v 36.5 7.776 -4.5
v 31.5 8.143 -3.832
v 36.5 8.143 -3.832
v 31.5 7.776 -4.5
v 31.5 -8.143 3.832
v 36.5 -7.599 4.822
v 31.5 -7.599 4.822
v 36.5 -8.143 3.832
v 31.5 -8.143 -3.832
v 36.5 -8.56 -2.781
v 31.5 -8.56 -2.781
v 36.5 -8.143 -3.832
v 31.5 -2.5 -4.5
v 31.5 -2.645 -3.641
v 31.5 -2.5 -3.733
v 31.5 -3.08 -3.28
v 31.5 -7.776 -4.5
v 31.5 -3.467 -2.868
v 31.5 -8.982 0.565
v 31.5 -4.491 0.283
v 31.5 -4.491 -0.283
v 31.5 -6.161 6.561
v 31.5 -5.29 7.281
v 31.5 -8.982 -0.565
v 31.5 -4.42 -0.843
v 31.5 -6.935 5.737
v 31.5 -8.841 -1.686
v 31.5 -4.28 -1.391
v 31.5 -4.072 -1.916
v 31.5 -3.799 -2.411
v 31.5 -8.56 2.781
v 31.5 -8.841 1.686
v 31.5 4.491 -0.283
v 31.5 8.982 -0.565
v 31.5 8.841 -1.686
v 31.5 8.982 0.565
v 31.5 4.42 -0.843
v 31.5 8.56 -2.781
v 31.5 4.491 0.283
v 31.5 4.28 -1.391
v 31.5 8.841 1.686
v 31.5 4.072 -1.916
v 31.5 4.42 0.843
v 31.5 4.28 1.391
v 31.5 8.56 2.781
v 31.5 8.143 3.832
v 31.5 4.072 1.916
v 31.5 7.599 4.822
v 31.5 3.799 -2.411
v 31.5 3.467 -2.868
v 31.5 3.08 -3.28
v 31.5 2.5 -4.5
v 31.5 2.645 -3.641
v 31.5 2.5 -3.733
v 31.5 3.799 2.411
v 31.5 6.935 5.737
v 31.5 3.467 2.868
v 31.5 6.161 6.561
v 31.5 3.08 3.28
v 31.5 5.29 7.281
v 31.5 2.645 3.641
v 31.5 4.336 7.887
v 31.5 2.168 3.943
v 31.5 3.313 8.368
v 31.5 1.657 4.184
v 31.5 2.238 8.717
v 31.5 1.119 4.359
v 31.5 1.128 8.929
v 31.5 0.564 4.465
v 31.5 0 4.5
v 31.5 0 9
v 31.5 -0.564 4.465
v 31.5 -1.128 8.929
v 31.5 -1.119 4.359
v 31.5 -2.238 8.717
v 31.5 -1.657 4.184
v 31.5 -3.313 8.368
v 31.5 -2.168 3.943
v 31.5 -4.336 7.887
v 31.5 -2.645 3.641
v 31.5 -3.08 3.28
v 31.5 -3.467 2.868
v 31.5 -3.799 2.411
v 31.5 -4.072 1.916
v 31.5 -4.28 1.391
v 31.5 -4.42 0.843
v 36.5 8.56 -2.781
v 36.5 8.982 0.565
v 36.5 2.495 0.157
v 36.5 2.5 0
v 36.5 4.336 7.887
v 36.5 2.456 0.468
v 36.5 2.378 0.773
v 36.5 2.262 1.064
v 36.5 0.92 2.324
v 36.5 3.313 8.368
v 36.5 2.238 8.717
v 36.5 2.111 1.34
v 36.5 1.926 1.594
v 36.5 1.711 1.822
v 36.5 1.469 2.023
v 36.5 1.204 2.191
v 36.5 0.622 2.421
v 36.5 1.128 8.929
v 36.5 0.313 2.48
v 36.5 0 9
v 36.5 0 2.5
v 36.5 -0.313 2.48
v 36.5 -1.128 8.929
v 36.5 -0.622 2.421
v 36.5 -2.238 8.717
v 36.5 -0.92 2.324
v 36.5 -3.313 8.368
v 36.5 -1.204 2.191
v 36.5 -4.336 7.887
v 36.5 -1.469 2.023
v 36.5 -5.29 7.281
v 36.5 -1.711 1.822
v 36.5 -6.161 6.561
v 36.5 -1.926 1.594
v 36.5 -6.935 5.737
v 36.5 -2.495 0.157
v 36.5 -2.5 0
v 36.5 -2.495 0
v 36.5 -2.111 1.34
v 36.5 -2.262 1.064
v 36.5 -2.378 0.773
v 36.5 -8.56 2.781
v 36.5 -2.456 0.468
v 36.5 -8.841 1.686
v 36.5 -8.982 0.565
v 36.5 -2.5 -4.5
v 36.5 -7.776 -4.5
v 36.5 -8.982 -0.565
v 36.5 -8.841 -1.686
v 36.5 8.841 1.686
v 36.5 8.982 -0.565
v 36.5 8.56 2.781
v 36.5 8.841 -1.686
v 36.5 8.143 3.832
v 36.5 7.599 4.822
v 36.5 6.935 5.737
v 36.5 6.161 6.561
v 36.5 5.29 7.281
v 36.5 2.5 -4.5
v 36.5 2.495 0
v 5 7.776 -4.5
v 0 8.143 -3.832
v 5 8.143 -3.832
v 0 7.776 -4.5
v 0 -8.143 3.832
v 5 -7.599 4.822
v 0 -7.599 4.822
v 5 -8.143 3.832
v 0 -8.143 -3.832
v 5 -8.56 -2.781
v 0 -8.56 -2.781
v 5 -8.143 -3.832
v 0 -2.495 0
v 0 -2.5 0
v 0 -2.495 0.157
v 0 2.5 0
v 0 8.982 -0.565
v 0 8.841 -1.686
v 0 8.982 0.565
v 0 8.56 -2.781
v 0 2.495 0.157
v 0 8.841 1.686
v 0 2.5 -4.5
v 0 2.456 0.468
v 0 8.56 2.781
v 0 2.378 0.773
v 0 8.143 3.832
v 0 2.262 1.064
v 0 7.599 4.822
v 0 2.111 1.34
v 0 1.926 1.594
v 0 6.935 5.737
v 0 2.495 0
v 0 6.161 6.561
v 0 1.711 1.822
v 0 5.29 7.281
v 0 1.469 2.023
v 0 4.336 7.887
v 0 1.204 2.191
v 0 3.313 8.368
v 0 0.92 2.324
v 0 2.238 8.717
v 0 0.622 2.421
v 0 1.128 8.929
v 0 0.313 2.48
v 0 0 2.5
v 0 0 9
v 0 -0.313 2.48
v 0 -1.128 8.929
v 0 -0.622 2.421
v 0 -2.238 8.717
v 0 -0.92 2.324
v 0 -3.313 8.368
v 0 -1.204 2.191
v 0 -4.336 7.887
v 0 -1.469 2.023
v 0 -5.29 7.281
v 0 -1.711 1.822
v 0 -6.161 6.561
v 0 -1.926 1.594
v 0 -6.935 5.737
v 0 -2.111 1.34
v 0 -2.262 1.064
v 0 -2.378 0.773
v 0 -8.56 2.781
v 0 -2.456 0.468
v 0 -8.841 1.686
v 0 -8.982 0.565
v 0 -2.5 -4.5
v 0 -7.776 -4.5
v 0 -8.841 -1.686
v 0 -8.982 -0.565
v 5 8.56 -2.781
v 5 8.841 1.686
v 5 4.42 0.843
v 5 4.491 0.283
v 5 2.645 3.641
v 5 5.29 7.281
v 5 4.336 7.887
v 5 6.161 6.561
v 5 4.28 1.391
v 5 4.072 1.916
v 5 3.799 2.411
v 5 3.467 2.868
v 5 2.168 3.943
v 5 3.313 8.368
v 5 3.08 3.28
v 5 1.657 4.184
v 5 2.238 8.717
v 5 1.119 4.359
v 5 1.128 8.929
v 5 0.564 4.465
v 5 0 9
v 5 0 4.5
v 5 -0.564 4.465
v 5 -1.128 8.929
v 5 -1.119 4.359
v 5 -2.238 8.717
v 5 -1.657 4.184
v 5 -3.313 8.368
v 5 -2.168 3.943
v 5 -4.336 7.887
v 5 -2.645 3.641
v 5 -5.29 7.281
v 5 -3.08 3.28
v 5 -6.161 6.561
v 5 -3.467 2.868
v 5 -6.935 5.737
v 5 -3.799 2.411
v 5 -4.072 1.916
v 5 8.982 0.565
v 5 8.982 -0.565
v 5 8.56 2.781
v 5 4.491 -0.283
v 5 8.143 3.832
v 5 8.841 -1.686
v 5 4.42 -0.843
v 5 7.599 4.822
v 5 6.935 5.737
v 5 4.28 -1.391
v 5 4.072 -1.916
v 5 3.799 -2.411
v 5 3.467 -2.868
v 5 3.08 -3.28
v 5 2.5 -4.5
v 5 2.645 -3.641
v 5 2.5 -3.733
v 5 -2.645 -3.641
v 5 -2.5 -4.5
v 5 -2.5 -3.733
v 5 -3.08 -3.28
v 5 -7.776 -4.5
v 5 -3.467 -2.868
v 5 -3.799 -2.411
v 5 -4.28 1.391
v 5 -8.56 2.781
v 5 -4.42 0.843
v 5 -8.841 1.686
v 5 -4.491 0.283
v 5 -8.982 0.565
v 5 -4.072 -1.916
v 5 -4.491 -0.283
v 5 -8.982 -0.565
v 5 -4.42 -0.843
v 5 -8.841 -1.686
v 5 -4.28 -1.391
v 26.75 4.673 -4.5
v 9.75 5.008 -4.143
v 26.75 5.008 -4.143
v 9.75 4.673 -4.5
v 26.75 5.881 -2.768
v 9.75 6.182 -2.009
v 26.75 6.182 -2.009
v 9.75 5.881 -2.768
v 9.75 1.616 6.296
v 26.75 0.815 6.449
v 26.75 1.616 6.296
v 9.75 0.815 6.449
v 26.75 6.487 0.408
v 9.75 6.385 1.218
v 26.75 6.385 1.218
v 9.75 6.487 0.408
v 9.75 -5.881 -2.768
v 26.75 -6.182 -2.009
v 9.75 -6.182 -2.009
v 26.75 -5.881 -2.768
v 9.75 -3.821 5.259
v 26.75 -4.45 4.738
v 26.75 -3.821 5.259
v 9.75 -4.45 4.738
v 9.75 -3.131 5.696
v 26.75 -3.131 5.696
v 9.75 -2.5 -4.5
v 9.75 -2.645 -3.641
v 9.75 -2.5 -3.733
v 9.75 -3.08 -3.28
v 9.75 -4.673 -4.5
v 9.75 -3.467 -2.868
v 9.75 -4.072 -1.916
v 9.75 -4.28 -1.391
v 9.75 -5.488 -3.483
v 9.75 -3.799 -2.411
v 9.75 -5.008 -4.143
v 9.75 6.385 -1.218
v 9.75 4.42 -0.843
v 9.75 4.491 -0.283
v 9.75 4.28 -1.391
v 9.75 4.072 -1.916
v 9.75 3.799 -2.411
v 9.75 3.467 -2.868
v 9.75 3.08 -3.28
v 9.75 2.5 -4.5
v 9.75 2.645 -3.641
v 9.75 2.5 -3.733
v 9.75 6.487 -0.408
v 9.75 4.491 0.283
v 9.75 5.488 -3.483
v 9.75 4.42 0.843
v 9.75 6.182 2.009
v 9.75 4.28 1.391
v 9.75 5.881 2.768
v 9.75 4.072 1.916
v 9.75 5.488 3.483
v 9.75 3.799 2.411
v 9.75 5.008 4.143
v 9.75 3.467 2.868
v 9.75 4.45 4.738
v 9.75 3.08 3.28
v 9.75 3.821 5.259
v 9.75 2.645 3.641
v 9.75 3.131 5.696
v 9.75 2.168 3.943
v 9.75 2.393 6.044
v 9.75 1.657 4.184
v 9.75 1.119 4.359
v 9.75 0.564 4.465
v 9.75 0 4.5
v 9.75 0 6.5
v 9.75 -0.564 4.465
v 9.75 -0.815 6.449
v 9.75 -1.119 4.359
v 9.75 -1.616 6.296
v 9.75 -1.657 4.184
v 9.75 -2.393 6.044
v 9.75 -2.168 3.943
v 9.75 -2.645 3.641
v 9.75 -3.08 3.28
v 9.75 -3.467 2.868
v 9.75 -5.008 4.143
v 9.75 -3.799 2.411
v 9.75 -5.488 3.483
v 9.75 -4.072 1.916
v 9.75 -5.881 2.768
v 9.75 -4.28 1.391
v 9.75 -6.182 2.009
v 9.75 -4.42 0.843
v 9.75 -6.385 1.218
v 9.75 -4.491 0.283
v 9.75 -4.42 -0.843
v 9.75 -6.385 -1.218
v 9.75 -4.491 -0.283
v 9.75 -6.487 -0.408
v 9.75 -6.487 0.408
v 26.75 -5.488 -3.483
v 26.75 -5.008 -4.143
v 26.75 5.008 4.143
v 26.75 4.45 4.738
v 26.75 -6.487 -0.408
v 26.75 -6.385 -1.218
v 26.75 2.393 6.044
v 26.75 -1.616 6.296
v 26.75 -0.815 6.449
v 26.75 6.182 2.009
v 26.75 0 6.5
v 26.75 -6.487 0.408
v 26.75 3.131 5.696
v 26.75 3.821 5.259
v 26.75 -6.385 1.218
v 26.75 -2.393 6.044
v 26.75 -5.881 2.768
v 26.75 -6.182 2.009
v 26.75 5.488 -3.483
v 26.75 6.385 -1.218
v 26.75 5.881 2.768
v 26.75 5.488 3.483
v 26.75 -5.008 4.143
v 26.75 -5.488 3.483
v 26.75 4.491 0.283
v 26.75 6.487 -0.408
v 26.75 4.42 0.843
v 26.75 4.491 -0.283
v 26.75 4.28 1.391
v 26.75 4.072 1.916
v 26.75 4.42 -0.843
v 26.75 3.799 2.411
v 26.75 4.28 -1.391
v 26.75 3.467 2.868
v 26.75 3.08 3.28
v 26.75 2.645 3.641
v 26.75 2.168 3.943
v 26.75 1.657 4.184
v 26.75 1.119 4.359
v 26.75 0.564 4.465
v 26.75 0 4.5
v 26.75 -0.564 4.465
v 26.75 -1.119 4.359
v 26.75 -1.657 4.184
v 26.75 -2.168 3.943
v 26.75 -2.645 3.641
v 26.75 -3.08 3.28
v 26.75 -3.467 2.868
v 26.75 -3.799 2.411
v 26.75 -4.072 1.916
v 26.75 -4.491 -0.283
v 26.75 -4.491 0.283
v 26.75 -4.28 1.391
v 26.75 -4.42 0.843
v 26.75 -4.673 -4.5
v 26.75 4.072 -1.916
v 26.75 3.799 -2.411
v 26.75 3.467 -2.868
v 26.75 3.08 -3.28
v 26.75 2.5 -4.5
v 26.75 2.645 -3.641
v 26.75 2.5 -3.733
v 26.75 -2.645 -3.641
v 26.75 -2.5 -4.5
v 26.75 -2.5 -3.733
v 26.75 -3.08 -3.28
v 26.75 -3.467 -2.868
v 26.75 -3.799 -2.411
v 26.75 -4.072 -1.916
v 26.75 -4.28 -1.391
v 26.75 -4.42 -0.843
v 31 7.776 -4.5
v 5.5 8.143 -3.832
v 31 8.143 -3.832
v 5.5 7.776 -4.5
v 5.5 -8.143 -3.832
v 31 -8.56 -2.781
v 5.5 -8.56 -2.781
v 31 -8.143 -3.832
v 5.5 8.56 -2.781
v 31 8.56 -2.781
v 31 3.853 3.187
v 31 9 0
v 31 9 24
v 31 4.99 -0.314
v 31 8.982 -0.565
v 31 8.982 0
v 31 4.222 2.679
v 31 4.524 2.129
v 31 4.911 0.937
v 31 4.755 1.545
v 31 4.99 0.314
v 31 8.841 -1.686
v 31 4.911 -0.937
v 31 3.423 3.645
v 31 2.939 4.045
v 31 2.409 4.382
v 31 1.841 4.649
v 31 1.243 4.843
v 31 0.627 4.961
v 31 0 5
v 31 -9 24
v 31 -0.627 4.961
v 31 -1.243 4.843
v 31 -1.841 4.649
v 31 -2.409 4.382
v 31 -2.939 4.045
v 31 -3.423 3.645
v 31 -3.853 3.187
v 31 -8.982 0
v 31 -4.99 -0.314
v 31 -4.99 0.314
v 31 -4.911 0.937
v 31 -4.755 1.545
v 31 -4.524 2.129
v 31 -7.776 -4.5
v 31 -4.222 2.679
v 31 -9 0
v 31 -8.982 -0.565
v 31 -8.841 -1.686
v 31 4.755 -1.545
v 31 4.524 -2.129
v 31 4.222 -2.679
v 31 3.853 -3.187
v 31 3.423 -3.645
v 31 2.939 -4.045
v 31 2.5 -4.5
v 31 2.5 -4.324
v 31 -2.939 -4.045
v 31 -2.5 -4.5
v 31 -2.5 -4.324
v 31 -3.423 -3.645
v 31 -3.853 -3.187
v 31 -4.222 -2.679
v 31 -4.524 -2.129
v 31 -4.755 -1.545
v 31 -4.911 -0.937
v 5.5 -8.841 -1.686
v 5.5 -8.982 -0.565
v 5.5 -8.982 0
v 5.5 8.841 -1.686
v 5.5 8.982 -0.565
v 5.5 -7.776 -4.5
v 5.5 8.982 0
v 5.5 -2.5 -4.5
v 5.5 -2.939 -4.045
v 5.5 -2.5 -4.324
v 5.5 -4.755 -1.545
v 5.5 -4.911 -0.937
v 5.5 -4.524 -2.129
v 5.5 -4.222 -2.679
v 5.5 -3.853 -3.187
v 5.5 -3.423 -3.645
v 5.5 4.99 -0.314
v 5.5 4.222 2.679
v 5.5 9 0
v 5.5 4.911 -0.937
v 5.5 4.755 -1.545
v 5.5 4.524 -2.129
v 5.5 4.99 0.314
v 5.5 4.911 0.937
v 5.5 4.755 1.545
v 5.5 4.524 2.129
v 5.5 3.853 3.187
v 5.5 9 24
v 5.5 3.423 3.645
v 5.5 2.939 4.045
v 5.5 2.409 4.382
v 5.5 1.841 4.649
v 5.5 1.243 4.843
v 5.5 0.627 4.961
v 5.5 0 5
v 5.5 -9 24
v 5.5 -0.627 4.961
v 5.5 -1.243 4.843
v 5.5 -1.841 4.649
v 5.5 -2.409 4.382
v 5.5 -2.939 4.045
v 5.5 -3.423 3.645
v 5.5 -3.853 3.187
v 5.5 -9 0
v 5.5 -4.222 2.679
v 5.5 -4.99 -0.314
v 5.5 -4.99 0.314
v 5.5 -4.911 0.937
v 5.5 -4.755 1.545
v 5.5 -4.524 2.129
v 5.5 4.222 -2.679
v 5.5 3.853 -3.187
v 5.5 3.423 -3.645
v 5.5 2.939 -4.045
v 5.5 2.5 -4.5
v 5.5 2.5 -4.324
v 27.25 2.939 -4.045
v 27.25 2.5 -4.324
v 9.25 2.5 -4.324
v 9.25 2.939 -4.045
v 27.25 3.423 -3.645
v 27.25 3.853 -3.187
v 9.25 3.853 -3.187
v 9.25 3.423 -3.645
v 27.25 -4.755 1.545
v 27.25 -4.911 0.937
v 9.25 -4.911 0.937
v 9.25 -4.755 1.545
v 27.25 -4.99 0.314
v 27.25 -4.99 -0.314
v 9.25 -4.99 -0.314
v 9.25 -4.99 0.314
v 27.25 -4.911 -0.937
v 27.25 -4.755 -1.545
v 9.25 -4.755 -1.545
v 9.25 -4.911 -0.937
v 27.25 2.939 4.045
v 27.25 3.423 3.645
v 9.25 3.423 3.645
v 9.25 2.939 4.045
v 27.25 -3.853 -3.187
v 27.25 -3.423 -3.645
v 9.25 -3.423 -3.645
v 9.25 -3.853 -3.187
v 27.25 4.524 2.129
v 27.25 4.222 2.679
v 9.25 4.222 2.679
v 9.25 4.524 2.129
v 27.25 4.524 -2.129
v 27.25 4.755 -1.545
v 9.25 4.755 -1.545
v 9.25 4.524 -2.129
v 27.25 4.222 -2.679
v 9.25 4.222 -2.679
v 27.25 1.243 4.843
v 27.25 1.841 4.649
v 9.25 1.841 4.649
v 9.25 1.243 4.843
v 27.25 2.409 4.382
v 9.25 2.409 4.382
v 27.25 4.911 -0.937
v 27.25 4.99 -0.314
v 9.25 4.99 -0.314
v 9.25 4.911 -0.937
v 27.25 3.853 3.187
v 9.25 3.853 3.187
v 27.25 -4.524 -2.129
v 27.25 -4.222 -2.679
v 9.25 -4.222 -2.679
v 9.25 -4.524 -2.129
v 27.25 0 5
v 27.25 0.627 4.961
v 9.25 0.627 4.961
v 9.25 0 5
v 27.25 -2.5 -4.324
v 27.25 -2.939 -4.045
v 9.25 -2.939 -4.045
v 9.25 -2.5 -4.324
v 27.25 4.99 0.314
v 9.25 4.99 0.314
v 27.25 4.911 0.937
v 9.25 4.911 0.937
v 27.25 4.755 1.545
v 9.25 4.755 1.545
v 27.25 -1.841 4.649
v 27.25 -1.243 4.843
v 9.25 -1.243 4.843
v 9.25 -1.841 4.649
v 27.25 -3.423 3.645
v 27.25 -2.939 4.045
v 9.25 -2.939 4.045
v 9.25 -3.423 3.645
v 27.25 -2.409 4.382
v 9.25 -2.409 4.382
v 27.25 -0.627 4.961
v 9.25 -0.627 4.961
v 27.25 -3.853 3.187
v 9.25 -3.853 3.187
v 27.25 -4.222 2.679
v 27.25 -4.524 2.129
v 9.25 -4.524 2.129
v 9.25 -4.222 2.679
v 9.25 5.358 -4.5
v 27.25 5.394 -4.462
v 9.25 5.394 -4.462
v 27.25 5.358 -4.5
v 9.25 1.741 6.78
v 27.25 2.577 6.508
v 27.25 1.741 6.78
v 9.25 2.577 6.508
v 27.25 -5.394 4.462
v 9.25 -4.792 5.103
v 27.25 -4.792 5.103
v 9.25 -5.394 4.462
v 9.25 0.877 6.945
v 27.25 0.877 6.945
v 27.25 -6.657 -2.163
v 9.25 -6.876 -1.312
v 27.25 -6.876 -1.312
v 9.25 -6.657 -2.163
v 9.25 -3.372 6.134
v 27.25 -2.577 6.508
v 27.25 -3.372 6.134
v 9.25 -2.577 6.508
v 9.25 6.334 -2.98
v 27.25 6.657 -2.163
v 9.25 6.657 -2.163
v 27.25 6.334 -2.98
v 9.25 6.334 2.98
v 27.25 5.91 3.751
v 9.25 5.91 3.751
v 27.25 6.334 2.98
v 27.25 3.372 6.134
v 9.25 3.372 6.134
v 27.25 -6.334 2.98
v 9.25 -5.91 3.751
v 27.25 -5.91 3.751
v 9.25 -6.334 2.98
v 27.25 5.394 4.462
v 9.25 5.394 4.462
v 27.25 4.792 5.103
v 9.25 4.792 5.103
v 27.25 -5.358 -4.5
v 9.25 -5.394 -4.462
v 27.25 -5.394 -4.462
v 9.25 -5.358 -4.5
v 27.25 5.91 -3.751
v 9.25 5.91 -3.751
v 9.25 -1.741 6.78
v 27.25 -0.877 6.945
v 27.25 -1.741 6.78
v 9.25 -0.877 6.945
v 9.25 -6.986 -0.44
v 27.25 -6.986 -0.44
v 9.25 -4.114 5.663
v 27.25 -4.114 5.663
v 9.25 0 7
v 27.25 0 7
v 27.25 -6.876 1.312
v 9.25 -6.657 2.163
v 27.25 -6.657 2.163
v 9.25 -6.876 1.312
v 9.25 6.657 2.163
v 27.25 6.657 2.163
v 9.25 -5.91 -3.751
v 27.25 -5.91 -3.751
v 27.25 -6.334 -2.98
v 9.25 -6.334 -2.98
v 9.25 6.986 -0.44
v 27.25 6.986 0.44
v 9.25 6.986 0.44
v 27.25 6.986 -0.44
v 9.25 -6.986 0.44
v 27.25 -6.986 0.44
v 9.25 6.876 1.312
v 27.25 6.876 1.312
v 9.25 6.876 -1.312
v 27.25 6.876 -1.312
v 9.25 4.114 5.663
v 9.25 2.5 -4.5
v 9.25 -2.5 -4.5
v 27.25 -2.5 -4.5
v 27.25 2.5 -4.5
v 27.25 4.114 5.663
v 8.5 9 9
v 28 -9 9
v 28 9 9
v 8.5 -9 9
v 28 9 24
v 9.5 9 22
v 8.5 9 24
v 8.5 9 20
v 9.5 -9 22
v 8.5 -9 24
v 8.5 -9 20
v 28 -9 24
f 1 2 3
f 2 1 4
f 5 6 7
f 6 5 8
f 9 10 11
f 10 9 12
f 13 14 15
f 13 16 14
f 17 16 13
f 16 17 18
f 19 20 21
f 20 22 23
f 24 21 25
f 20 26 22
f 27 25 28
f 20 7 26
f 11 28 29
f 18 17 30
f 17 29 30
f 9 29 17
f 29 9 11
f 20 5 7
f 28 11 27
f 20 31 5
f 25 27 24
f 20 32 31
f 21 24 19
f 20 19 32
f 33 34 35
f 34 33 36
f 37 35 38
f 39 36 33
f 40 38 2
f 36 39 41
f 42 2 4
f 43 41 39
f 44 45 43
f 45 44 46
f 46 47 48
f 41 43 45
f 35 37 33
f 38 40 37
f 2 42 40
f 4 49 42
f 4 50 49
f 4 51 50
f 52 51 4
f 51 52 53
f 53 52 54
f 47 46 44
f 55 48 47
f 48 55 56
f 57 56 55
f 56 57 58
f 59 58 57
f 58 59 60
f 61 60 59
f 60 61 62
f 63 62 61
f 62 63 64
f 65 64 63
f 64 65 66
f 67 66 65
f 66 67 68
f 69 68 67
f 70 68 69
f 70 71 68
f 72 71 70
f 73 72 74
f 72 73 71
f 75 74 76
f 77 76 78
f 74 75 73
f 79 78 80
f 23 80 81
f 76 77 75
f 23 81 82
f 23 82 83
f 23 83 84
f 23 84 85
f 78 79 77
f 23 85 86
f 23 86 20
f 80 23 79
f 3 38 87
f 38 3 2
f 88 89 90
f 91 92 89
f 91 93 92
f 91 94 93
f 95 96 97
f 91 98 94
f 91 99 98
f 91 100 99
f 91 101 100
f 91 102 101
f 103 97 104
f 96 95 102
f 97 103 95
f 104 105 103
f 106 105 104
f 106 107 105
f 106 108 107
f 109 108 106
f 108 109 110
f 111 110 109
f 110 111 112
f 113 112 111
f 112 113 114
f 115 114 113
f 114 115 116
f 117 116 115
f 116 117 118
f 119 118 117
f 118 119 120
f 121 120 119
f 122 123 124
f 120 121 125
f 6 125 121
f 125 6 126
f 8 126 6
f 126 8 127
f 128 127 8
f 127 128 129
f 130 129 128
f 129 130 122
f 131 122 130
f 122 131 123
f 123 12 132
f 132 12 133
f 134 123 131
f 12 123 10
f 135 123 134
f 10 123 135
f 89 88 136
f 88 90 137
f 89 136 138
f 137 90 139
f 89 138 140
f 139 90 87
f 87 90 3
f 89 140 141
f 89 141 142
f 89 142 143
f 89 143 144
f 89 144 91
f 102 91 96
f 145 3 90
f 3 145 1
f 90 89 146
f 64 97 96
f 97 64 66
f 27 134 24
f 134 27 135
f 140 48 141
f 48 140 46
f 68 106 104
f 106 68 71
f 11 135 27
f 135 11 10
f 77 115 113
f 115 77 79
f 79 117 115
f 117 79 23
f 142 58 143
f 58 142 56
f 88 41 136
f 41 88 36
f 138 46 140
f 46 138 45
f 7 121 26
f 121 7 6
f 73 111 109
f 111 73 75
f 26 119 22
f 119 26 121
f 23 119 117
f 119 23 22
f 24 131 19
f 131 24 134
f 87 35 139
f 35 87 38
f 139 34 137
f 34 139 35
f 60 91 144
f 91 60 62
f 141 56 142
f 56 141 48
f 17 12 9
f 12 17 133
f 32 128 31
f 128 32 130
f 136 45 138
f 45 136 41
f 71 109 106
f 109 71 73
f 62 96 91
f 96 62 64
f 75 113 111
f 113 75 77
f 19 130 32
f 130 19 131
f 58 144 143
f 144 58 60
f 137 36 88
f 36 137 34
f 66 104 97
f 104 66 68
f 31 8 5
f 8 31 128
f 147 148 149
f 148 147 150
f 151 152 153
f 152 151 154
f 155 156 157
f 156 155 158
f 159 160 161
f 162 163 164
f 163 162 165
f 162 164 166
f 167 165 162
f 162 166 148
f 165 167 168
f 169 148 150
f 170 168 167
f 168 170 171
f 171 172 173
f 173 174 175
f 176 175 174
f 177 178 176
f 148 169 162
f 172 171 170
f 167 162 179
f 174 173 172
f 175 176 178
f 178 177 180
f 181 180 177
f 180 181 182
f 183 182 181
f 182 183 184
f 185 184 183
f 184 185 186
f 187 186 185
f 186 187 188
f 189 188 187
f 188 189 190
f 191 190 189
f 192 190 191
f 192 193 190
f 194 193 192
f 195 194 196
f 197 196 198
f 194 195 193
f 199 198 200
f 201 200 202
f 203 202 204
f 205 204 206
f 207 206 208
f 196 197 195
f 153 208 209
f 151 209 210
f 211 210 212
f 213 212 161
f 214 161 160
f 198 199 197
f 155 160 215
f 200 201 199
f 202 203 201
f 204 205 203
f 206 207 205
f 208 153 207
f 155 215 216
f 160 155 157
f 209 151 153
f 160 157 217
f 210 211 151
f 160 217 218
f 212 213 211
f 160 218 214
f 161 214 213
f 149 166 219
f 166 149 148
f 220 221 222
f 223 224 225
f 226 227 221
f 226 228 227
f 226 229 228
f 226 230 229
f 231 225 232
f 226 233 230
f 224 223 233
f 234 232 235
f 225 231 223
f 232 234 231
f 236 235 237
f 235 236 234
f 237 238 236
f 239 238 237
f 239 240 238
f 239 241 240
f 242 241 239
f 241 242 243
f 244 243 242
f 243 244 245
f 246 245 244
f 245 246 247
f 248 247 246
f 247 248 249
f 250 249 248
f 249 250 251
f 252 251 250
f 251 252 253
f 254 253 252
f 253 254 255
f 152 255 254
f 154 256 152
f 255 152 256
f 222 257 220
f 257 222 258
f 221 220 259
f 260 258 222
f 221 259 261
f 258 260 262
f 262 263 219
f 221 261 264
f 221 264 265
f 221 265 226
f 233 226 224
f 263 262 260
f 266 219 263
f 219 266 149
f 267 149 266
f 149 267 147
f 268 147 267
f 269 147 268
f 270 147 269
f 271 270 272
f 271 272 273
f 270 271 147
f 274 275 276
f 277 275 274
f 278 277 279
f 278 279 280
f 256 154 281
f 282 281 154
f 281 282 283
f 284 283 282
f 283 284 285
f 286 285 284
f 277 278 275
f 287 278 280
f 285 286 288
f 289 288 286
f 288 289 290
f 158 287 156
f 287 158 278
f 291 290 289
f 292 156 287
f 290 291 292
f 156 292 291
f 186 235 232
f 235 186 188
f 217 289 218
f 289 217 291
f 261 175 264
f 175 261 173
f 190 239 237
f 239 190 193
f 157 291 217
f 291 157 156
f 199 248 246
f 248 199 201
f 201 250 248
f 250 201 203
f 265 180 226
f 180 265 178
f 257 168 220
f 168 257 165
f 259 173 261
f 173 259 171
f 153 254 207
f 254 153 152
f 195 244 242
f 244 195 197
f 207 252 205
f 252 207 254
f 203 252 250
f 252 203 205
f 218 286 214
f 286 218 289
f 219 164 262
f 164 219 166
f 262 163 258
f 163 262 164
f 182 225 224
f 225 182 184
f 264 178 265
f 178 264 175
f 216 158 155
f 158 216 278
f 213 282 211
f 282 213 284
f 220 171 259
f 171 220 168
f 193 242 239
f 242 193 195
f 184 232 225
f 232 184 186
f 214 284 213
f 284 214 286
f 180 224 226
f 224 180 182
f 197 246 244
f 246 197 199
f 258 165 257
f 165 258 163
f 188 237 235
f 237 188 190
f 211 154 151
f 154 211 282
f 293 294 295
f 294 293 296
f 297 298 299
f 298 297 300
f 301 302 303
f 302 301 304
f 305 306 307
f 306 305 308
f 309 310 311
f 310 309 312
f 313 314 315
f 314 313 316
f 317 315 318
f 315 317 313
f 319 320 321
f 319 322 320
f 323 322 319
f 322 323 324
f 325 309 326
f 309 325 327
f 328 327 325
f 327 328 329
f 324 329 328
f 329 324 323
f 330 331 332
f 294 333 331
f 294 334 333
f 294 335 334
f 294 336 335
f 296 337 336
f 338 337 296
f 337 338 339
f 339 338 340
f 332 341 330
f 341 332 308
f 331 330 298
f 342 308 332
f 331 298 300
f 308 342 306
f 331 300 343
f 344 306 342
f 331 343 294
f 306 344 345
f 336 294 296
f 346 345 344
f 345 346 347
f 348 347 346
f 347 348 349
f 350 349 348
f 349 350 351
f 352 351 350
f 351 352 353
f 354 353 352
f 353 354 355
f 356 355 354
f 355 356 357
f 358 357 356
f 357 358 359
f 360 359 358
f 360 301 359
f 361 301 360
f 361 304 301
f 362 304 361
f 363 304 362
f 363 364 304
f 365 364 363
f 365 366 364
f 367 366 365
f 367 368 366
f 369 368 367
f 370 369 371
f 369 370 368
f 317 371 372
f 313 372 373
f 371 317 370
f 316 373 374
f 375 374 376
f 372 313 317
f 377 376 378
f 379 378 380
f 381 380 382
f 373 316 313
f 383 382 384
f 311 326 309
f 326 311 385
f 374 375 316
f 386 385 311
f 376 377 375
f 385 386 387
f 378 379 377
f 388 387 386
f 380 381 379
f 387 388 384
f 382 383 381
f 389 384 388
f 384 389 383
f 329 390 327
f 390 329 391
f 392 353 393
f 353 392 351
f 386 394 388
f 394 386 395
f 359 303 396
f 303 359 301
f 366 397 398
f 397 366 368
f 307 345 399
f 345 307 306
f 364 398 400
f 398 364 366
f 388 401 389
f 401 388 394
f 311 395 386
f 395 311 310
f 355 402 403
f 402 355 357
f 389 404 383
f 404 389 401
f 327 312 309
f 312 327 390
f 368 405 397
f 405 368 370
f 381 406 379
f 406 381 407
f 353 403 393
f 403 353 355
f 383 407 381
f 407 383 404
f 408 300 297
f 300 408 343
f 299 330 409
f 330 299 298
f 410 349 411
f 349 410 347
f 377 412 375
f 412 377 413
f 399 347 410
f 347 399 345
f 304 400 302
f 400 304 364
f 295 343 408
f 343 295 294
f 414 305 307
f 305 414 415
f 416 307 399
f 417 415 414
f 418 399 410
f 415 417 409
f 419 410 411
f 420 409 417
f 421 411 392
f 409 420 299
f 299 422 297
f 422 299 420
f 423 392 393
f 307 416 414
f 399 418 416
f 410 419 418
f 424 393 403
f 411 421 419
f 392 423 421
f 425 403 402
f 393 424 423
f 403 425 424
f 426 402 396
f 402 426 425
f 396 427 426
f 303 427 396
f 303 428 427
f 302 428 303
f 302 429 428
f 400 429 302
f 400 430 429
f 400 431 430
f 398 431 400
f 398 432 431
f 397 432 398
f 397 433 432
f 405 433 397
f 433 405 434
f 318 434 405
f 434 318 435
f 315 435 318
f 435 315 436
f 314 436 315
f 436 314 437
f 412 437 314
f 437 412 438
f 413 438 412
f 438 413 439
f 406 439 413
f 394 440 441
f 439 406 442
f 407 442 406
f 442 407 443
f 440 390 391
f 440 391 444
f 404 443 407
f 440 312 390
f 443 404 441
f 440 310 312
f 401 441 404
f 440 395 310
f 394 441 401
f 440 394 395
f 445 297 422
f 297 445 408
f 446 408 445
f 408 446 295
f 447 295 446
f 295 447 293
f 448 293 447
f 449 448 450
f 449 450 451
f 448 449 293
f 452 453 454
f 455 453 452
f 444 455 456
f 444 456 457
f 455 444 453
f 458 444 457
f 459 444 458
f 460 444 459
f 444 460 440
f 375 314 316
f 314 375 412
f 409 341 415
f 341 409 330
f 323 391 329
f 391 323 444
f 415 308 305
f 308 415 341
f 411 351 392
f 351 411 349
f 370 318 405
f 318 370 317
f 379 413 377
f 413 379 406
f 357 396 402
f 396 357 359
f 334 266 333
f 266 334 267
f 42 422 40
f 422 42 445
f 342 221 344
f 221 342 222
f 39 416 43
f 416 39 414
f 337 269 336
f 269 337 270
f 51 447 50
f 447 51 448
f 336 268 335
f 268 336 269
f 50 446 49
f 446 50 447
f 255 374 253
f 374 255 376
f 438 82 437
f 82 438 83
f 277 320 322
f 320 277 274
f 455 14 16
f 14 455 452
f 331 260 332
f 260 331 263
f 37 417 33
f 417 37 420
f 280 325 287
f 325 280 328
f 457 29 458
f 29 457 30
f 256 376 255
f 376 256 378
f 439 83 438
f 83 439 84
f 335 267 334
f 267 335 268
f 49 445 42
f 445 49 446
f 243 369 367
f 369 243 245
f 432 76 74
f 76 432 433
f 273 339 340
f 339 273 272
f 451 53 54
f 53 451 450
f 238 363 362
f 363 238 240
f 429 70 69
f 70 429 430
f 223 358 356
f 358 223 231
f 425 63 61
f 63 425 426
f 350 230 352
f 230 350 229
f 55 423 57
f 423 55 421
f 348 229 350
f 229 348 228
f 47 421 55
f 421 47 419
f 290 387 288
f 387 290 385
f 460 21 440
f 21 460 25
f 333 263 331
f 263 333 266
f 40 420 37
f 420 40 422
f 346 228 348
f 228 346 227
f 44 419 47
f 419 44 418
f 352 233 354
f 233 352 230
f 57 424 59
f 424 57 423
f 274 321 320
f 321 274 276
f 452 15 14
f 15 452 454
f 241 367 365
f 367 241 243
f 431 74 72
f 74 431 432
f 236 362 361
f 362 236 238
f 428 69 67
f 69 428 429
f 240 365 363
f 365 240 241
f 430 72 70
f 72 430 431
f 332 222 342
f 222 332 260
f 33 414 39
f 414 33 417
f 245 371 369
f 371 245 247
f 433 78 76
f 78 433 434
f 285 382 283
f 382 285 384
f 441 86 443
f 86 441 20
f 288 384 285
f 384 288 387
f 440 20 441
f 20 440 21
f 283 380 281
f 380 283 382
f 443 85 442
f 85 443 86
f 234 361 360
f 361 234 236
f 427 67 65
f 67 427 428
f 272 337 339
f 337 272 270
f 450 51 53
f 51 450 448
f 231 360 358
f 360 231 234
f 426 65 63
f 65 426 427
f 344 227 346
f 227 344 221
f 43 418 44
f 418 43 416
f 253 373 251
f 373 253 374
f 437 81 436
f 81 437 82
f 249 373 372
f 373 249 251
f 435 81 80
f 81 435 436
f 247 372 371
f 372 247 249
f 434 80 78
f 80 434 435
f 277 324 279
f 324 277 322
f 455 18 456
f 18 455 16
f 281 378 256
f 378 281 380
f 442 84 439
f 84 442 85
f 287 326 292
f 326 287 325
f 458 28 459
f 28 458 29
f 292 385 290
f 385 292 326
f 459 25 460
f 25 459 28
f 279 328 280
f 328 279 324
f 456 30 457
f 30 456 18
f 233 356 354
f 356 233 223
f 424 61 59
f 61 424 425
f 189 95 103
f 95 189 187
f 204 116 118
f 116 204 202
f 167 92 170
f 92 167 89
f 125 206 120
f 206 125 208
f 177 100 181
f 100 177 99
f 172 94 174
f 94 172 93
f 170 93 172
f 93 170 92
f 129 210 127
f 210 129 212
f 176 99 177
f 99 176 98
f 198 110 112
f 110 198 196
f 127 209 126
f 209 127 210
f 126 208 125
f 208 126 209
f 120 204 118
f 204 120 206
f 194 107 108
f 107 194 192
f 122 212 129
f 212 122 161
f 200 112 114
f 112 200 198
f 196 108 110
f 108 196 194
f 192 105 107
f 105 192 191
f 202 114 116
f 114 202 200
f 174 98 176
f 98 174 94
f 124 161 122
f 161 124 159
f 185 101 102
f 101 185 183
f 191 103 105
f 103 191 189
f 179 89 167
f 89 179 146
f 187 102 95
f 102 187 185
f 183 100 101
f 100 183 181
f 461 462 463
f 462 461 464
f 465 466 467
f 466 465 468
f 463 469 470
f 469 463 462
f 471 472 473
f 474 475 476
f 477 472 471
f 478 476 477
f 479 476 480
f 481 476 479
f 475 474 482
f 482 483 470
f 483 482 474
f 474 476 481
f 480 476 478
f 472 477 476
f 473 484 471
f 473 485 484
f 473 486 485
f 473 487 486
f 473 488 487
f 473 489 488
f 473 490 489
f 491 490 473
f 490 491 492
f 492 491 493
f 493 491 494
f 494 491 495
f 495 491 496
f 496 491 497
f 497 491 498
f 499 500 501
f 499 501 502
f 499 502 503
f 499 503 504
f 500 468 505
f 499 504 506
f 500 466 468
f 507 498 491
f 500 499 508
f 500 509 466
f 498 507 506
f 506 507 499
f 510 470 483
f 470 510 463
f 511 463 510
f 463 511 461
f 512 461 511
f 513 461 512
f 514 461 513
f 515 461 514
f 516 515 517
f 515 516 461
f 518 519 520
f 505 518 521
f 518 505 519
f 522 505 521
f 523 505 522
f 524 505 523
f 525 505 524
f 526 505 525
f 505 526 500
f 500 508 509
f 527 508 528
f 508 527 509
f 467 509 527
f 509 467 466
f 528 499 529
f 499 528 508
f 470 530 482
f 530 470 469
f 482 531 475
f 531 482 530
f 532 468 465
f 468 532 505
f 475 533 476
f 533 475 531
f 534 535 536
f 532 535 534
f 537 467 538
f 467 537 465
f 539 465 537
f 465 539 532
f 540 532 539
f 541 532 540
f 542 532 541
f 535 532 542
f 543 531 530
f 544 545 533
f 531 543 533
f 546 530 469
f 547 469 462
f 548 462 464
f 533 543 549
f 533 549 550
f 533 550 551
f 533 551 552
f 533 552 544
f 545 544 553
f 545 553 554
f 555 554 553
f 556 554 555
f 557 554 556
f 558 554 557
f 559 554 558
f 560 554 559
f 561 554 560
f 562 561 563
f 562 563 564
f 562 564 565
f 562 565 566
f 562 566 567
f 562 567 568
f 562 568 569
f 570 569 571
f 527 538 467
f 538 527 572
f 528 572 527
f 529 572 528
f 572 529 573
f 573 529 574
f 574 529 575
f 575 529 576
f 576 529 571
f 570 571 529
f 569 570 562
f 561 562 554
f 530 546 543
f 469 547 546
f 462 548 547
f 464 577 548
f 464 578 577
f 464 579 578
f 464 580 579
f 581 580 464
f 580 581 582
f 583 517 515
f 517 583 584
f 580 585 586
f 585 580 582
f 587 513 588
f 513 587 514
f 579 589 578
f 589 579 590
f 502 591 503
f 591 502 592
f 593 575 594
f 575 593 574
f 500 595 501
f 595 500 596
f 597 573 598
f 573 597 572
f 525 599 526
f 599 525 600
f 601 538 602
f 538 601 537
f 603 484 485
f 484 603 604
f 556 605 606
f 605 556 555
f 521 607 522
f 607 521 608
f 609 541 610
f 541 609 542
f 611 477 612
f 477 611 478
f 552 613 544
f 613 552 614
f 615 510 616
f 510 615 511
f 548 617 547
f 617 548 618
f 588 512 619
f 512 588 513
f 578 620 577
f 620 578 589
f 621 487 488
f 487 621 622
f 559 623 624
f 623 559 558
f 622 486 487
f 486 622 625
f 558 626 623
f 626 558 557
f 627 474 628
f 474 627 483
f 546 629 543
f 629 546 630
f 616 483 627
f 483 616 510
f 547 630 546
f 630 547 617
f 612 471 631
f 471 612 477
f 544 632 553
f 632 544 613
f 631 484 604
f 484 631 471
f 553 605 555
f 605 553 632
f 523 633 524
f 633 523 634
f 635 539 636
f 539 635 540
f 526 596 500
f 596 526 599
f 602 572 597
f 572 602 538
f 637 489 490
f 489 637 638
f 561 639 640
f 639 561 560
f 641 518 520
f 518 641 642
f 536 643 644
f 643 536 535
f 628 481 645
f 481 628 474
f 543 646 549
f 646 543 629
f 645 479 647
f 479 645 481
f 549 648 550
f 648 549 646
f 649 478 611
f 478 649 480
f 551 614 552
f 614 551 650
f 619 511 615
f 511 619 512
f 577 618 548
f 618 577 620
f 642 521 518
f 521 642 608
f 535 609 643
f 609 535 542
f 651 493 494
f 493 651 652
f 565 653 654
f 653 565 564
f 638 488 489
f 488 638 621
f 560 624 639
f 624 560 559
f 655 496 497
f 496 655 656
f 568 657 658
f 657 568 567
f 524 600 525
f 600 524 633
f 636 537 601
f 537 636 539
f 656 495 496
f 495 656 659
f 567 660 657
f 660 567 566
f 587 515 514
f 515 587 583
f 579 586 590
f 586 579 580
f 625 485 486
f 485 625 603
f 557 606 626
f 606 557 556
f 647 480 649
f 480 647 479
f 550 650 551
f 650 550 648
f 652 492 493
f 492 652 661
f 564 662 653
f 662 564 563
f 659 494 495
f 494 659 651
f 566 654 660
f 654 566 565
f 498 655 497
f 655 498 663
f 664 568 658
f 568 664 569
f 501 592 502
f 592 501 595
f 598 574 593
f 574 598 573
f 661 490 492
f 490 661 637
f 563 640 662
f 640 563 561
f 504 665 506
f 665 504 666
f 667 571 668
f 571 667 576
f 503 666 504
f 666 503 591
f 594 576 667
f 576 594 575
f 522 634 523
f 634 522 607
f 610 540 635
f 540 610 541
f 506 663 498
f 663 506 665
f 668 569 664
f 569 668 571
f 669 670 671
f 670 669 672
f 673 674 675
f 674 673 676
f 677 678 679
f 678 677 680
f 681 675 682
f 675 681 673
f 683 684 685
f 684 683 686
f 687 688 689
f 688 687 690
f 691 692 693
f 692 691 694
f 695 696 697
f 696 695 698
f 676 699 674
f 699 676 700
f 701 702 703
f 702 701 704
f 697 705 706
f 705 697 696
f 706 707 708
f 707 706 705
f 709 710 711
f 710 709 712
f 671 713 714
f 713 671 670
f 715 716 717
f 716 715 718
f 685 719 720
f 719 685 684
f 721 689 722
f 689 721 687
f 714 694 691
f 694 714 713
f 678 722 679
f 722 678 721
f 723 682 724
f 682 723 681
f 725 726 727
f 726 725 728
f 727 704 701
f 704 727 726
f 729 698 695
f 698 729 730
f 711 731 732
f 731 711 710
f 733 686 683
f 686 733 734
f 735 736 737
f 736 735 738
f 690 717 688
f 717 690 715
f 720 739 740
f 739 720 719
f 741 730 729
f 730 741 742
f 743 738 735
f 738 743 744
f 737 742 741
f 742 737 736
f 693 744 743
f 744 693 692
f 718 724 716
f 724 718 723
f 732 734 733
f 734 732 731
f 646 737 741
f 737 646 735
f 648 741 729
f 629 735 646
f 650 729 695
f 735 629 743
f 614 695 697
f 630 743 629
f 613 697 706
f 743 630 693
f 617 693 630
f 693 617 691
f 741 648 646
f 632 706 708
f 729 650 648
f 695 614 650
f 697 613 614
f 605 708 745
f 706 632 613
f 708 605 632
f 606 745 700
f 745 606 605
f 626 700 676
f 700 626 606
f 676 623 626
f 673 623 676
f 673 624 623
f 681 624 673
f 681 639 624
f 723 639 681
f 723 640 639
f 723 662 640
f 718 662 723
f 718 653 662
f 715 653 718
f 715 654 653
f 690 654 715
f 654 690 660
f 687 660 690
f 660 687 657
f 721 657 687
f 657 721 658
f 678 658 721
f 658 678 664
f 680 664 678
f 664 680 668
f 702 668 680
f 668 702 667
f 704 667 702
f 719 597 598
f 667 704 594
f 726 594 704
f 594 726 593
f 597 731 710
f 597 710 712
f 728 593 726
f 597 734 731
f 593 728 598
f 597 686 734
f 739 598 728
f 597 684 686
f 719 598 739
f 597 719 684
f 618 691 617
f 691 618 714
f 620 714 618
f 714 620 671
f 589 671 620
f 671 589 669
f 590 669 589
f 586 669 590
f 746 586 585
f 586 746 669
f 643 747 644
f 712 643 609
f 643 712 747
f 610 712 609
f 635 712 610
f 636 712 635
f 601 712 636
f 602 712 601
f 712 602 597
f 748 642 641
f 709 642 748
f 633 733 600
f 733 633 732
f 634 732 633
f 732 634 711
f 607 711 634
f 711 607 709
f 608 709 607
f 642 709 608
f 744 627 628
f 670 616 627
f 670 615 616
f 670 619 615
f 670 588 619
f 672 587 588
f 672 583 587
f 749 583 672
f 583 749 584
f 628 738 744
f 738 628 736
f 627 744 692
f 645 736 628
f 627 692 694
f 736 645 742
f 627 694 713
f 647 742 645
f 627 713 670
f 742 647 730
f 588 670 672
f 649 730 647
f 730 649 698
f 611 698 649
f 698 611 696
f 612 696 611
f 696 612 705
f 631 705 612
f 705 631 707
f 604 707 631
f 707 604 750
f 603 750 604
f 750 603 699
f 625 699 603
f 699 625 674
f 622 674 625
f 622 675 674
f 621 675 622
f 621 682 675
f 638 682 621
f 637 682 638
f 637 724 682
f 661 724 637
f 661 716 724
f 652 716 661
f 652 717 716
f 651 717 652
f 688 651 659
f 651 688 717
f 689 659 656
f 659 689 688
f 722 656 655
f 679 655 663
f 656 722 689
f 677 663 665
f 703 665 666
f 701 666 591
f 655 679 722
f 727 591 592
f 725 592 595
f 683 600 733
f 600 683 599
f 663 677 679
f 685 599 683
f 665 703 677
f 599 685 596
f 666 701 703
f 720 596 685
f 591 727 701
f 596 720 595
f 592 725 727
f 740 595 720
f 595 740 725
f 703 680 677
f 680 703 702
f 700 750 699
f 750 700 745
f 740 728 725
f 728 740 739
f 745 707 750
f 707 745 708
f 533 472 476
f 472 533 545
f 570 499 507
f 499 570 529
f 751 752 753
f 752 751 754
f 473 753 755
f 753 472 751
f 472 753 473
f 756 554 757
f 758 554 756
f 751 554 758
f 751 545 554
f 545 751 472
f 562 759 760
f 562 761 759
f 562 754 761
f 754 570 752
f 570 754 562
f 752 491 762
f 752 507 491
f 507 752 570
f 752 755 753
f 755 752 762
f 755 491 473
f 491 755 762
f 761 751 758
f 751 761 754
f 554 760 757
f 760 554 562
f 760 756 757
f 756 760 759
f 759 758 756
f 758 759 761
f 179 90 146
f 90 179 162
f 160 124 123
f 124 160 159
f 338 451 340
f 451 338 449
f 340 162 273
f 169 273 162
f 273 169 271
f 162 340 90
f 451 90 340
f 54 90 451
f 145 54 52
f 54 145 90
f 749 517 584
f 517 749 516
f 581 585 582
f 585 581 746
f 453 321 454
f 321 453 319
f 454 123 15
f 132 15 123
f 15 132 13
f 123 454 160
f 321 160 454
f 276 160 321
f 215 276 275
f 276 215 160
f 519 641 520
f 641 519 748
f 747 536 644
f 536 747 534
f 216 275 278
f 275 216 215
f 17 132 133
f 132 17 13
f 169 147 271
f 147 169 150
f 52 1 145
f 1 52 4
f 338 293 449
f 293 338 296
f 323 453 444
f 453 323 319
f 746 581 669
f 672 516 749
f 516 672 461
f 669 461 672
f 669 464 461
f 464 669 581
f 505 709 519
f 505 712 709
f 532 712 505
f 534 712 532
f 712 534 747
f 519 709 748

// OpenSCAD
/* [PrintOptions] */
// preview[view:south east, tilt:bottom diagonal]

// splits the cable holder into 2 parts for printing if your machine doesn't do well with printing tight tolerances
show_seperate = "no"; // [yes, no]

/* [Basic] */
// is the diameter of the cable in mm to be held by the cable holder
cable_diameter = 5;
// sets the distance between the holding tabs in mm
table_thickness = 19.5;
// controls the distance between moving parts of the cable holder
tolerance = 0.5;


/* [Table_tabs] */
// adjusts the length of the tabs in mm that will hold the cable holder on to the table
tab_length = 15;
// adjusts how thick the tabs that hold the cable holder to the table should be in mm
tab_thickness = 3;

/* [Table_grip] */
// adjusts the triangular grip protrusion height in mm
grip_height = 1;
// adjusts the base width of the triangular grip protrusion in mm
grip_width = 4;

/* [Thumbwheels] */
//controls how tall the end thumbwheels should be in mm
thumbwheel_height = 5;

/* [Advanced] */
// is confusing name, just play with it and see what it does
retainer_factor = 6; // [3, 4, 5, 6, 7, 8, 9, 10]
// is another one to play around with.  Choose values between 0 and 2
plane_cut_factor = 1;
// is the quality of the cylinders
$fn = 50;

/* [Advanced_neck] */
// is the thickness of the inner rotating cuff in mm
neck_thickness = 2;

/* [Advanced_holder] */
// controls the overall thickness of the outer holder in mm
holder_thickness = 4;

/* [Hidden] */
barrel_lift_factor = 1/retainer_factor;
barrel_thickness = holder_thickness/2;

holder_height = 2*tab_thickness + table_thickness;
holder_diameter = cable_diameter + 2*neck_thickness + 2*tolerance + 2*holder_thickness;
plane_cut_depth = plane_cut_factor*(cable_diameter/2 + neck_thickness);

preview_tab = "";

rotate([0,90,0]) difference()
{

	// main holder barrels and tabs
	union()
	{
		// inner barrel
		
		if(show_seperate == "no")
		{
			InnerBarrel();
		}
		else
		{
			translate([0, holder_diameter + 5, 0]) 
			difference()
			{
				InnerBarrel();
				// cable notch
				translate([0, -cable_diameter/2, -0.5]) cube([holder_diameter/2 + 0.5, cable_diameter, thumbwheel_height + tolerance + holder_height + tolerance + thumbwheel_height + 1]);
				// plane slice
				translate([plane_cut_depth, -(holder_diameter + 1)/2, -0.5]) cube([holder_diameter/2 + 0.5, holder_diameter + 1, thumbwheel_height + tolerance + holder_height + tolerance + thumbwheel_height + 1]);
			}
		}
		
		// outer holder barrel
		highlight("Advanced_holder") difference()
		{
			// main body of the holder
			translate([0,0, thumbwheel_height + tolerance]) cylinder(r = holder_diameter/2, h = holder_height);
			
			// tolerance for neck
			translate([0,0,thumbwheel_height + tolerance + -0.5]) cylinder(r = cable_diameter/2 + neck_thickness + tolerance, h = holder_height + 1);
			// tolerance for the barrel
			translate([0,0, thumbwheel_height + tolerance + barrel_lift_factor*holder_height-tolerance]) cylinder(r = cable_diameter/2 + neck_thickness + barrel_thickness + tolerance, h = holder_height*(1-2*barrel_lift_factor) + 2*tolerance);
		}
		
		// main body holder
		union()
		{
			// upper tab
			highlight("Table_tabs") translate([-tab_length - holder_diameter/2, -holder_diameter/2, thumbwheel_height + tolerance + holder_height - tab_thickness]) cube([tab_length + 0.1, holder_diameter, tab_thickness]);
			// lower tab
			highlight("Table_tabs")translate([-tab_length - holder_diameter/2, -holder_diameter/2, thumbwheel_height + tolerance]) cube([tab_length + 0.1, holder_diameter, tab_thickness]);
			// lower grip
			highlight("Table_grip") translate([-tab_length - holder_diameter/2, holder_diameter/2,  thumbwheel_height + tolerance + tab_thickness]) rotate([90, 0, 0]) linear_extrude(height = holder_diameter, convexity = 10) polygon(points = [[0,0], [grip_width/2,grip_height], [grip_width,0], [grip_width,-0.1], [0,-0.1]]);
			
			// body block to  cylinder
			highlight("Advanced_holder") difference()
			{
				// main body block
				translate([-holder_diameter/2, -holder_diameter/2, thumbwheel_height + tolerance]) cube([holder_diameter/2, holder_diameter, holder_height]);
				// cylinder cut
				translate([0,0, thumbwheel_height + tolerance - 0.1]) cylinder(r = holder_diameter/2, h = holder_height + 1);
			}
		}
	}

	// cable notch
	translate([0, -cable_diameter/2, -0.5]) cube([holder_diameter/2 + 0.5, cable_diameter, thumbwheel_height + tolerance + holder_height + tolerance + thumbwheel_height + 1]);
	// plane slice
	translate([plane_cut_depth, -(holder_diameter + 1)/2, -0.5]) cube([holder_diameter/2 + 0.5, holder_diameter + 1, thumbwheel_height + tolerance + holder_height + tolerance + thumbwheel_height + 1]);
}

module InnerBarrel()
{
	difference()
		{
			union()
			{
				// top thumbwheel
				highlight("Thumbwheels") translate([0,0, thumbwheel_height + tolerance + holder_height+tolerance]) cylinder(r = holder_diameter/2, h = thumbwheel_height);
				// bottom thumbwheel
				highlight("Thumbwheels") cylinder(r = holder_diameter/2, h = thumbwheel_height);
				// retaining barrel
				translate([0,0, thumbwheel_height + tolerance + barrel_lift_factor*holder_height]) cylinder(r = cable_diameter/2 + neck_thickness + barrel_thickness, h = holder_height*(1-2*barrel_lift_factor));
				// the main barrel, or the "neck"
				highlight("Advanced_neck") cylinder(r = cable_diameter/2 + neck_thickness, h =thumbwheel_height + tolerance +  holder_height + tolerance + thumbwheel_height);
			}

			// The hole for the cable to go through
			translate([0,0,-.5]) cylinder(r = cable_diameter/2, h = thumbwheel_height + tolerance + holder_height + tolerance + thumbwheel_height + 1);
		}
}

module highlight(this_tab)
{
	if(preview_tab == this_tab)
	{
		color("red") child(0);
	}
	else
	{	
		child(0);
	}
}
